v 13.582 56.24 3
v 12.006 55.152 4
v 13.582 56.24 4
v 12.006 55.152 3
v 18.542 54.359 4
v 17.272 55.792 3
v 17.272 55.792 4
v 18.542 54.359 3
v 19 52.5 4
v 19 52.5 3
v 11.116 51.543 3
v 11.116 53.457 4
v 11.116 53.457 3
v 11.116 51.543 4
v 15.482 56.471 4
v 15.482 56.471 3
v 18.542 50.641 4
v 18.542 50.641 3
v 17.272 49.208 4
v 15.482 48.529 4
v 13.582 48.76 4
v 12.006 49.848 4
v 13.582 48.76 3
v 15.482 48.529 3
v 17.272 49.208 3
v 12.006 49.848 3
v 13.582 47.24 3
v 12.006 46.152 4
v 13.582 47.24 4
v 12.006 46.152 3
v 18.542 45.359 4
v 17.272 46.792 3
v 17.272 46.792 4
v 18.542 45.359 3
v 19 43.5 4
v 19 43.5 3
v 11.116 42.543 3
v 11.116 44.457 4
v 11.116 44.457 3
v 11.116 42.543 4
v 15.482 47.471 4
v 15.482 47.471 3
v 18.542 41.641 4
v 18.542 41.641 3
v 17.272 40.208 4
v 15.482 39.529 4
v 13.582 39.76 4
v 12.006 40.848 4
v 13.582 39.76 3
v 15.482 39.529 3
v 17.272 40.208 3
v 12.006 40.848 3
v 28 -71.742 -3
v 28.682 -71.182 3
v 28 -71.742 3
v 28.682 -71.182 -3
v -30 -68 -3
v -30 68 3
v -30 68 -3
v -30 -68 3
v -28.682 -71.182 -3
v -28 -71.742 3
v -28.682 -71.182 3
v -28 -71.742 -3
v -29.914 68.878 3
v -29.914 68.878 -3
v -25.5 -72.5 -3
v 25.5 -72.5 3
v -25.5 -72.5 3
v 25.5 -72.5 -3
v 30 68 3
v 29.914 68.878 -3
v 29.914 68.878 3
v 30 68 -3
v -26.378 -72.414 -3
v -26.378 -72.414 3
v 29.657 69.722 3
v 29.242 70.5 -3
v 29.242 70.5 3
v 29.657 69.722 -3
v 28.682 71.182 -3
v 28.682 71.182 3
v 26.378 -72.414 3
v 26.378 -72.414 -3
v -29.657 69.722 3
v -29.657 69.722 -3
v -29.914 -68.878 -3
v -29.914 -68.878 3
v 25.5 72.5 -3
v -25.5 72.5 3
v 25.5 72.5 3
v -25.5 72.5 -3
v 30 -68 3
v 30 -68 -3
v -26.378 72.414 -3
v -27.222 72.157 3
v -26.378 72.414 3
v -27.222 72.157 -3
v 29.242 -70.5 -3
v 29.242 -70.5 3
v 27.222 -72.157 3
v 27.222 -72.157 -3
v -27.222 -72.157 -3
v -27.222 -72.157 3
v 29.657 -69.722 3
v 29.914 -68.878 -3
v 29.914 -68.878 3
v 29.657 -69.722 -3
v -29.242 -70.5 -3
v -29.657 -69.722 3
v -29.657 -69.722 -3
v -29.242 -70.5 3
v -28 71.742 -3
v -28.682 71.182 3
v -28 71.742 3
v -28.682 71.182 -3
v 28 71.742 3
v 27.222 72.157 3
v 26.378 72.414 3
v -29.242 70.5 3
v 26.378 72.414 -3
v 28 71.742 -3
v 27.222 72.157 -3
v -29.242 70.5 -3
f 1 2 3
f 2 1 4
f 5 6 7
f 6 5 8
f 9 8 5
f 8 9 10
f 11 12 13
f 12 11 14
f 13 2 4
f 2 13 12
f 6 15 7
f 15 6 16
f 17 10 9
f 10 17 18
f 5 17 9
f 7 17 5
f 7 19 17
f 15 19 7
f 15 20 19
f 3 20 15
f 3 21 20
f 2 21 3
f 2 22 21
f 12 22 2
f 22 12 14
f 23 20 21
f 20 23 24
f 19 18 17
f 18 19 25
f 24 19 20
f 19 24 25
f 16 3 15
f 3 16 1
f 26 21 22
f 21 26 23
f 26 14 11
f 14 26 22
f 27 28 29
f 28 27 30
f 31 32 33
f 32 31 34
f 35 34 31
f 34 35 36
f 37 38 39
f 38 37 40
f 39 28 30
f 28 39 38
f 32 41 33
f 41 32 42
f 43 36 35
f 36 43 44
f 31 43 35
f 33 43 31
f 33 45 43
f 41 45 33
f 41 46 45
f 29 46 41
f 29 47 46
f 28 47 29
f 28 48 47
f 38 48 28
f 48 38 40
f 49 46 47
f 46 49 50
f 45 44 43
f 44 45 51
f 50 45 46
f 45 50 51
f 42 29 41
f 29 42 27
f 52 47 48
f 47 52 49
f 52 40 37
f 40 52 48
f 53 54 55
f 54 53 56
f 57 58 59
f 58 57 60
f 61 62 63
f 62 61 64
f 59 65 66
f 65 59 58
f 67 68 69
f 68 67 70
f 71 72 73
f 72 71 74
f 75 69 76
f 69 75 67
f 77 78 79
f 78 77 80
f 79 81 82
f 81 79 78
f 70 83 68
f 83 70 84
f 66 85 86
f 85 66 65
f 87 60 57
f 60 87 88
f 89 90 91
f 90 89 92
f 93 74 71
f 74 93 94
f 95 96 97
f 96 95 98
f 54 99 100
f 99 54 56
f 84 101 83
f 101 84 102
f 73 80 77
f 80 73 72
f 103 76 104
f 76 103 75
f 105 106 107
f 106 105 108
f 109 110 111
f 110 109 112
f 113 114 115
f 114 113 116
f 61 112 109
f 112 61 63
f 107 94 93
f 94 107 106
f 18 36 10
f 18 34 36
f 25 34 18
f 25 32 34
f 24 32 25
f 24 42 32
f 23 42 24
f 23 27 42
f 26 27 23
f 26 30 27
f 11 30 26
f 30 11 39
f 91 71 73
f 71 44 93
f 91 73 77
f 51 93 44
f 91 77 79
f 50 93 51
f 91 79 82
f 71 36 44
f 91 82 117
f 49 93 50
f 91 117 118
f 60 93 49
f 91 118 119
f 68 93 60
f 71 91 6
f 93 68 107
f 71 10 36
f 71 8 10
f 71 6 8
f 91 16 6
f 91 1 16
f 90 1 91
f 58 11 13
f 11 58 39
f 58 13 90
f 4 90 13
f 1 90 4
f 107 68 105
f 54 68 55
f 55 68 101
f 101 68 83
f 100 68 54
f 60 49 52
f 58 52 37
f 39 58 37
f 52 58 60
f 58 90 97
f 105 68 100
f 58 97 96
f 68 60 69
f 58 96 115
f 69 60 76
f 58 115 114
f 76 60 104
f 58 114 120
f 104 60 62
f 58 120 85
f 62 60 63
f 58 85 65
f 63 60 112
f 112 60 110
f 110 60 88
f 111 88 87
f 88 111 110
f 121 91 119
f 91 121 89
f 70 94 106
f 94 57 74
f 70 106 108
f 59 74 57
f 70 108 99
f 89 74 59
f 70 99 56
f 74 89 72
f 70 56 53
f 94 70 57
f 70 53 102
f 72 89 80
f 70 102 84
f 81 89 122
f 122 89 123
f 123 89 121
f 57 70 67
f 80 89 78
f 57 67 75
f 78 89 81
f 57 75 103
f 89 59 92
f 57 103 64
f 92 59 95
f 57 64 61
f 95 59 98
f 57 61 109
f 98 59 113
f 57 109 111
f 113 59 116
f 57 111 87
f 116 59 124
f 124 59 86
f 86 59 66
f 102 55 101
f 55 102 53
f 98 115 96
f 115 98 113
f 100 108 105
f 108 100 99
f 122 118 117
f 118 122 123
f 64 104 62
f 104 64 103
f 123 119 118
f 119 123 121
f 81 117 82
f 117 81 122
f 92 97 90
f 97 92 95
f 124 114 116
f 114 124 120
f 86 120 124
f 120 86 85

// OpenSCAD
echo("Работа Алексея Коротких!");
len_phone = 145;
width_phone = 60;
thickness_phone = 6;
corner_round = 9;

smartphone();



module smartphone() {
    smartphone_block();
    cameras_block();
}

module cameras_block() {
    color("blue")
    translate([width_phone/2-15, len_phone/2-20, 0])
    cylinder(d=8, h = thickness_phone/2+1);

    color("blue")
    translate([width_phone/2-15, len_phone/2-29, 0])
    cylinder(d=8, h = thickness_phone/2+1);
}

module smartphone_block() {
    hull() {
        translate([width_phone/2-corner_round/2, len_phone/2-corner_round/2, 0])
        cylinder(h=thickness_phone, d=corner_round, $fn=32, center=true);
        
        mirror([1, 0, 0])
        translate([width_phone/2-corner_round/2, len_phone/2-corner_round/2, 0])
        cylinder(h=thickness_phone, d=corner_round, $fn=32, center=true);
        
        mirror([0, 1, 0])
        translate([width_phone/2-corner_round/2, len_phone/2-corner_round/2, 0])
        cylinder(h=thickness_phone, d=corner_round, $fn=32, center=true);
        
        mirror([1, 0, 0])
        mirror([0, 1, 0])
        translate([width_phone/2-corner_round/2, len_phone/2-corner_round/2, 0])
        cylinder(h=thickness_phone, d=corner_round, $fn=32, center=true);
    }
}
